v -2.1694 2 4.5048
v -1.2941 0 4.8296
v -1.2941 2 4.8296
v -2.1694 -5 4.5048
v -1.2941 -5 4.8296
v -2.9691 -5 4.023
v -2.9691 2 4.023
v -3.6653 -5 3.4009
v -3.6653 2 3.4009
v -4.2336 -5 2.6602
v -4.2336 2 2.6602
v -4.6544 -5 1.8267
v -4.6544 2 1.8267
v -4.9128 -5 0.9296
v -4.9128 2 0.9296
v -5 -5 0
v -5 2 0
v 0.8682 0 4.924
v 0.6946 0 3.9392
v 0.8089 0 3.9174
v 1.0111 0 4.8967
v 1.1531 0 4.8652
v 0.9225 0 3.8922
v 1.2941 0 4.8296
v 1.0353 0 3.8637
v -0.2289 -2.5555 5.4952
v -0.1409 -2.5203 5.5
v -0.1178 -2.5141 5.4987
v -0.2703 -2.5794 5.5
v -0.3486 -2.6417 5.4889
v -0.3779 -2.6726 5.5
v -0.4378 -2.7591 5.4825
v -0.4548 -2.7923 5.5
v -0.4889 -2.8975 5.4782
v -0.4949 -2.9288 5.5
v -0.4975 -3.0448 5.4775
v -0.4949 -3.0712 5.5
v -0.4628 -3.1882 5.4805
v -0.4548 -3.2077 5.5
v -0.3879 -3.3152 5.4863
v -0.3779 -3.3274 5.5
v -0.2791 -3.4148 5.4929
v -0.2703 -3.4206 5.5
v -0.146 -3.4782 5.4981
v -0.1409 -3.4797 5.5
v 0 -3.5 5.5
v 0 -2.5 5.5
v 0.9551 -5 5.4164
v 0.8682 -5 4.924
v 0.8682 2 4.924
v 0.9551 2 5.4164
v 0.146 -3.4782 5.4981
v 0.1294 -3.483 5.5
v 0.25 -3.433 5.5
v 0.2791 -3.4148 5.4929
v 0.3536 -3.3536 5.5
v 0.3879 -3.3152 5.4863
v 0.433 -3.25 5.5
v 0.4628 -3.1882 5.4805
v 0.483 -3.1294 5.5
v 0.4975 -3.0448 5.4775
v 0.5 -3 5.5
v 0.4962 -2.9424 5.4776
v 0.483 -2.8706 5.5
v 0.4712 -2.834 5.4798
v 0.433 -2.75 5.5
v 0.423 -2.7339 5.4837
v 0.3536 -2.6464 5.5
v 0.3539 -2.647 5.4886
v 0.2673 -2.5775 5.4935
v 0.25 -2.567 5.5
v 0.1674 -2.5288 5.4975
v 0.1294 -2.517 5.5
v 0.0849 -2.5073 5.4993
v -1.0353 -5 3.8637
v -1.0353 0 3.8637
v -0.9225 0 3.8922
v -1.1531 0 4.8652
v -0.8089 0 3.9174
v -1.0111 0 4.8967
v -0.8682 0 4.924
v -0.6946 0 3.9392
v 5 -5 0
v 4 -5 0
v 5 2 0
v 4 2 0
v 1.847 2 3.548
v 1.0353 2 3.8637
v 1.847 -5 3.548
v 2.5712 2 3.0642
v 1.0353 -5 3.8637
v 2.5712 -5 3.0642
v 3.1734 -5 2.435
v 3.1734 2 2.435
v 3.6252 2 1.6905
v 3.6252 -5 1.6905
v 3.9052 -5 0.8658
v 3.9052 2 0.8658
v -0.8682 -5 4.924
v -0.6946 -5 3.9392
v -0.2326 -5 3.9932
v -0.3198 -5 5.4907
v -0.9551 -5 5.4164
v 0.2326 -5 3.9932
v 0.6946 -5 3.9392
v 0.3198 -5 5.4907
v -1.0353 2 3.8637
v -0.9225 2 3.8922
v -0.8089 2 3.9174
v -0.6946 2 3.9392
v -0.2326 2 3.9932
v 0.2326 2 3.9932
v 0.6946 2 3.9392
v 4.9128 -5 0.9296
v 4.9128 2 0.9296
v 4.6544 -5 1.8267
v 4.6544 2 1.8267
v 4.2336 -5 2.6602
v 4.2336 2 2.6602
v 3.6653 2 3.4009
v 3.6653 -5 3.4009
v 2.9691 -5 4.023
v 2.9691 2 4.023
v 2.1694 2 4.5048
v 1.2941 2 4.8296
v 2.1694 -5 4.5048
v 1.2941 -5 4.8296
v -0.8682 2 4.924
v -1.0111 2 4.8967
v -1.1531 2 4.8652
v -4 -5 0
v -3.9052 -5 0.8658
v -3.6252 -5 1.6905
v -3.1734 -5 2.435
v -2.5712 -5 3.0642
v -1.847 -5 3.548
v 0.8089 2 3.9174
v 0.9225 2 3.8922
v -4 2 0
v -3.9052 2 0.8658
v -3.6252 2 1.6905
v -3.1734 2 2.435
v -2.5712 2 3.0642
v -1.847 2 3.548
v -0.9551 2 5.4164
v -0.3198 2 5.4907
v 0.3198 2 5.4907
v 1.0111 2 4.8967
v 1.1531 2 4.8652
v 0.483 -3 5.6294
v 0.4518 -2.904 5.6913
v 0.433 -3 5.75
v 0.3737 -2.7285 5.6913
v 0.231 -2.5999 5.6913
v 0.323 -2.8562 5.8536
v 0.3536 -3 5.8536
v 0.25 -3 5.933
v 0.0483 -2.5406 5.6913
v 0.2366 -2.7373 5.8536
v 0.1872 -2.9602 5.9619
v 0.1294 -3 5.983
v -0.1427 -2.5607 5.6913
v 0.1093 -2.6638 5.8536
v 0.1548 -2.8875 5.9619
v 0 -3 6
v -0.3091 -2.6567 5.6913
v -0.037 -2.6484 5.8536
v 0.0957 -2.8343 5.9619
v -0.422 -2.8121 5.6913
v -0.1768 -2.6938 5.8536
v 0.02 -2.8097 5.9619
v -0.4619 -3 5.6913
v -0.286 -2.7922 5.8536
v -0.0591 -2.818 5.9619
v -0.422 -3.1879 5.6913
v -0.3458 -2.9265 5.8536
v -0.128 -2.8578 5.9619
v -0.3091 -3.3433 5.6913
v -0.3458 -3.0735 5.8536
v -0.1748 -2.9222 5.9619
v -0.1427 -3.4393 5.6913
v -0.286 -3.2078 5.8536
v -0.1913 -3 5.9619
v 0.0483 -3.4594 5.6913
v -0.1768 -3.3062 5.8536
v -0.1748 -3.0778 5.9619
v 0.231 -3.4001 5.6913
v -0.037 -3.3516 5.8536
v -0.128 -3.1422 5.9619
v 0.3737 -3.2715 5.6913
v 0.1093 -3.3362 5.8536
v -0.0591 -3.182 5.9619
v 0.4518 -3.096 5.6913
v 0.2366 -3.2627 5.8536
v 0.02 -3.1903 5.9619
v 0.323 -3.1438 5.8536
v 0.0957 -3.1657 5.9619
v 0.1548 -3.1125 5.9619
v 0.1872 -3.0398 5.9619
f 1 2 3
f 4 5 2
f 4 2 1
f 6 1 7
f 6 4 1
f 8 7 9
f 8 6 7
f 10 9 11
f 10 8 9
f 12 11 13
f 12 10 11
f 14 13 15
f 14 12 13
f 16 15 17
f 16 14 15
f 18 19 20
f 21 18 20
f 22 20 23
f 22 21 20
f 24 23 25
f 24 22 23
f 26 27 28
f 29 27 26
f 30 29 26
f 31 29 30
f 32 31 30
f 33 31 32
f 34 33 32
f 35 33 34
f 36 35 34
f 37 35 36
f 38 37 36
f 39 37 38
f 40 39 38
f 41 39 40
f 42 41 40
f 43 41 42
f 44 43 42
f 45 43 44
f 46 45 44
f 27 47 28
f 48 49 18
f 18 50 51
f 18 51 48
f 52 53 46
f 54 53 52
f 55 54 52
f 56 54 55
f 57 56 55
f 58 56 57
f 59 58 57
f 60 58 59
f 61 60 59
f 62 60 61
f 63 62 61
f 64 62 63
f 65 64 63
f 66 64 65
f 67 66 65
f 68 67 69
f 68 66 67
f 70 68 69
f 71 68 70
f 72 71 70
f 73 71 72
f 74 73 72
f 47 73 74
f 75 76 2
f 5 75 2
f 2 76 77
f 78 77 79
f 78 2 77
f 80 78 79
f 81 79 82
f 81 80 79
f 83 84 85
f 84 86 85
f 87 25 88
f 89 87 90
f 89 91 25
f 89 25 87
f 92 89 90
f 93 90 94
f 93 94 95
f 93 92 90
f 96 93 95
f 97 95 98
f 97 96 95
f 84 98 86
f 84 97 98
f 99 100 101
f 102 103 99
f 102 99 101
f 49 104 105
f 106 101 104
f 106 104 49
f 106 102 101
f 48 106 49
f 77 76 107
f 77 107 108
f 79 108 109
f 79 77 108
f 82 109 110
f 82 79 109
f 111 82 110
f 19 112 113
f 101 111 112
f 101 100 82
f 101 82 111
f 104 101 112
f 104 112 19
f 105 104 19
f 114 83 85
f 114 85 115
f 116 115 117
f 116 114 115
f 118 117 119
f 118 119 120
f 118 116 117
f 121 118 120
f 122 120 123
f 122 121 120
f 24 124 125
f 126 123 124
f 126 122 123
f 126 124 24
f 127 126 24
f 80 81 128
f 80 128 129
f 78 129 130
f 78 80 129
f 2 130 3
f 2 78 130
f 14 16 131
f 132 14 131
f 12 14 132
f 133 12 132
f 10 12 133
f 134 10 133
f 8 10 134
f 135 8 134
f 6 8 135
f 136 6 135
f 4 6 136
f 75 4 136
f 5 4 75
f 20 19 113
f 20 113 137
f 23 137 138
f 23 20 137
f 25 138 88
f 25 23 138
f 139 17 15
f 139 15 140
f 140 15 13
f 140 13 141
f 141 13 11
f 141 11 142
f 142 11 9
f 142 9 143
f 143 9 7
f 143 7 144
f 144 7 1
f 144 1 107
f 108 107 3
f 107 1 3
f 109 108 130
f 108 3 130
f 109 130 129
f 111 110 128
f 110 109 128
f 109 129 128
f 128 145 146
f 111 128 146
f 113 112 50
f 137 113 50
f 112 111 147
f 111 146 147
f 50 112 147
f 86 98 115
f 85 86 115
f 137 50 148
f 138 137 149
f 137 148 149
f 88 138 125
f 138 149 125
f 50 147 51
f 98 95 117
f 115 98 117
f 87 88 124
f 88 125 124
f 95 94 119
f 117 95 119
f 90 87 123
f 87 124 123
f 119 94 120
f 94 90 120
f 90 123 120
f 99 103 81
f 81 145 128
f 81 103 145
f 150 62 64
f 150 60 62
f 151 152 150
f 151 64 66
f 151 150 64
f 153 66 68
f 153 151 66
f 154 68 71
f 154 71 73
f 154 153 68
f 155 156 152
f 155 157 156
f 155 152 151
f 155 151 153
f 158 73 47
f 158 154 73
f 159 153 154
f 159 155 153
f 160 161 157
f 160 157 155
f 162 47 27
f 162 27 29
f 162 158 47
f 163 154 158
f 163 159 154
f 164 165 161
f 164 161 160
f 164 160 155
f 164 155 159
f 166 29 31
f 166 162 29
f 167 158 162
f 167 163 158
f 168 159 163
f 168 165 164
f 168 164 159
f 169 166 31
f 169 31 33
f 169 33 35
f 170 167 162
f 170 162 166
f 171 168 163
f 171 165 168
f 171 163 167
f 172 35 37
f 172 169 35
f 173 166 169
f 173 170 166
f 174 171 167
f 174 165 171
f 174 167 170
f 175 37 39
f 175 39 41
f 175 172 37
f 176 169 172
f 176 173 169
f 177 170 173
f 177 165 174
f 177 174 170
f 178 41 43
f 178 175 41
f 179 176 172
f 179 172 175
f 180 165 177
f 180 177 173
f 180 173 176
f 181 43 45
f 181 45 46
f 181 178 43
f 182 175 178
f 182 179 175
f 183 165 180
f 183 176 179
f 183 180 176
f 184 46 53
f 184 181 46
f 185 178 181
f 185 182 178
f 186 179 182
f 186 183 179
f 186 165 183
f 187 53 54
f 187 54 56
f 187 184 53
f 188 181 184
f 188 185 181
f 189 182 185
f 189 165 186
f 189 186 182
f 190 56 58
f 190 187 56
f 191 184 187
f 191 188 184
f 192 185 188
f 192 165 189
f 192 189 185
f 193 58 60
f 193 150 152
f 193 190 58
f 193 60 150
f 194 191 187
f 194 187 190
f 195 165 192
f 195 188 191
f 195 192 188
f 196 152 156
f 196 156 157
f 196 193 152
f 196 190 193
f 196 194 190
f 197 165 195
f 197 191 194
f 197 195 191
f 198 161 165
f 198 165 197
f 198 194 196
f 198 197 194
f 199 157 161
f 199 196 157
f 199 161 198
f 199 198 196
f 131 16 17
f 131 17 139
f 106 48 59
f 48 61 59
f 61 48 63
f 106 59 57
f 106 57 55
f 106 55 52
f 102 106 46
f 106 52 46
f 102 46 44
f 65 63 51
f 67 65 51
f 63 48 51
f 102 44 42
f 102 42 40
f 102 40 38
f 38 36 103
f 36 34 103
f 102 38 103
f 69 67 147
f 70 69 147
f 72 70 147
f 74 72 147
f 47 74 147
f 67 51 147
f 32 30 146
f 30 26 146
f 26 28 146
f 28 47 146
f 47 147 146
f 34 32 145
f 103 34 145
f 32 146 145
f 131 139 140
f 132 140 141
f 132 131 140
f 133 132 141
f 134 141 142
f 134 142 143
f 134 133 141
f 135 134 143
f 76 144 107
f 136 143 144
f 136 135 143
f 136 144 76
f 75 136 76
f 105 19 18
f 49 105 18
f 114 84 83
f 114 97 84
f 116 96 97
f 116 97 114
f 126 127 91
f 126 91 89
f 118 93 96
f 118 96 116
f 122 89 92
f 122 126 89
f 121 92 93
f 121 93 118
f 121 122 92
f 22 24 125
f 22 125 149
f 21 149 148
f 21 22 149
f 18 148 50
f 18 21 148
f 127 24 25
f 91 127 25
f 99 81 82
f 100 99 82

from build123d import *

# Parameters (mm, degrees)
F1_DEPTH      = 2
F2_DEPTH      = 5
F2_DEPTH_BACK = 2
F3_DEPTH      = 5


with BuildPart() as f1:
    # F0 (on Front) → F1 (new body)
    with BuildSketch(Plane.XZ):
        with BuildLine():
            Line((4, 0), (5, 0))
            ThreePointArc((5, 0), (3.9667667015, 3.043807145), (1.2940952255, 4.8296291314))
            Line((1.2940952255, 4.8296291314), (1.0352761804, 3.8637033052))
            ThreePointArc((1.0352761804, 3.8637033052), (3.1734133612, 2.435045716), (4, 0))
        make_face()
        with BuildLine():
            Line((1.0352761804, 3.8637033052), (1.2940952255, 4.8296291314))
            ThreePointArc((1.2940952255, 4.8296291314), (1.0821980697, 4.8814800356), (0.8682408883, 4.9240387651))
            Line((0.8682408883, 4.9240387651), (0.6945927107, 3.939231012))
            ThreePointArc((0.6945927107, 3.939231012), (0.8657584558, 3.9051840285), (1.0352761804, 3.8637033052))
        make_face()
        with BuildLine():
            Line((0.6945927107, 3.939231012), (0.8682408883, 4.9240387651))
            ThreePointArc((0.8682408883, 4.9240387651), (0, 5), (-0.8682408883, 4.9240387651))
            Line((-0.8682408883, 4.9240387651), (-0.6945927107, 3.939231012))
            ThreePointArc((-0.6945927107, 3.939231012), (0, 4), (0.6945927107, 3.939231012))
        make_face()
        with BuildLine():
            ThreePointArc((-0.8682408883, 4.9240387651), (-1.0821980697, 4.8814800356), (-1.2940952255, 4.8296291314))
            Line((-1.2940952255, 4.8296291314), (-1.0352761804, 3.8637033052))
            ThreePointArc((-1.0352761804, 3.8637033052), (-0.8657584558, 3.9051840285), (-0.6945927107, 3.939231012))
            Line((-0.6945927107, 3.939231012), (-0.8682408883, 4.9240387651))
        make_face()
        with BuildLine():
            ThreePointArc((-1.2940952255, 4.8296291314), (-3.9667667015, 3.043807145), (-5, 0))
            Line((-5, 0), (-4, 0))
            ThreePointArc((-4, 0), (-3.1734133612, 2.435045716), (-1.0352761804, 3.8637033052))
            Line((-1.0352761804, 3.8637033052), (-1.2940952255, 4.8296291314))
        make_face()
    extrude(amount=-F1_DEPTH)

    # F0 (on Front) → F2 (join, two sides)
    with BuildSketch(Plane.XZ) as f2_sk:
        with BuildLine():
            Line((0.6945927107, 3.939231012), (0.8682408883, 4.9240387651))
            ThreePointArc((0.8682408883, 4.9240387651), (0, 5), (-0.8682408883, 4.9240387651))
            Line((-0.8682408883, 4.9240387651), (-0.6945927107, 3.939231012))
            ThreePointArc((-0.6945927107, 3.939231012), (0, 4), (0.6945927107, 3.939231012))
        make_face()
        with BuildLine():
            ThreePointArc((-0.8682408883, 4.9240387651), (0, 5), (0.8682408883, 4.9240387651))
            Line((0.8682408883, 4.9240387651), (0.9550649772, 5.4164426416))
            ThreePointArc((0.9550649772, 5.4164426416), (0, 5.5), (-0.9550649772, 5.4164426416))
            Line((-0.9550649772, 5.4164426416), (-0.8682408883, 4.9240387651))
        make_face()
    extrude(amount=F2_DEPTH)
    extrude(f2_sk.sketch, amount=-F2_DEPTH_BACK)

    # F0 (on Front) → F3 (join)
    with BuildSketch(Plane.XZ):
        with BuildLine():
            Line((4, 0), (5, 0))
            ThreePointArc((5, 0), (3.9667667015, 3.043807145), (1.2940952255, 4.8296291314))
            Line((1.2940952255, 4.8296291314), (1.0352761804, 3.8637033052))
            ThreePointArc((1.0352761804, 3.8637033052), (3.1734133612, 2.435045716), (4, 0))
        make_face()
        with BuildLine():
            ThreePointArc((-1.2940952255, 4.8296291314), (-3.9667667015, 3.043807145), (-5, 0))
            Line((-5, 0), (-4, 0))
            ThreePointArc((-4, 0), (-3.1734133612, 2.435045716), (-1.0352761804, 3.8637033052))
            Line((-1.0352761804, 3.8637033052), (-1.2940952255, 4.8296291314))
        make_face()
    extrude(amount=F3_DEPTH)

    # F5 (on offset) → F6 (revolve)
    with BuildSketch(Plane.XZ.offset(3)):
        with BuildLine():
            Line((0, 6), (0, 5))
            ThreePointArc((0, 5), (0.3535533906, 5.1464466094), (0.5, 5.5))
            ThreePointArc((0.5, 5.5), (0.3535533906, 5.8535533906), (0, 6))
        make_face()
    revolve(axis=Axis((0, -3, 4.2273908738), (0, 0, 1)))


solid = f1.part
